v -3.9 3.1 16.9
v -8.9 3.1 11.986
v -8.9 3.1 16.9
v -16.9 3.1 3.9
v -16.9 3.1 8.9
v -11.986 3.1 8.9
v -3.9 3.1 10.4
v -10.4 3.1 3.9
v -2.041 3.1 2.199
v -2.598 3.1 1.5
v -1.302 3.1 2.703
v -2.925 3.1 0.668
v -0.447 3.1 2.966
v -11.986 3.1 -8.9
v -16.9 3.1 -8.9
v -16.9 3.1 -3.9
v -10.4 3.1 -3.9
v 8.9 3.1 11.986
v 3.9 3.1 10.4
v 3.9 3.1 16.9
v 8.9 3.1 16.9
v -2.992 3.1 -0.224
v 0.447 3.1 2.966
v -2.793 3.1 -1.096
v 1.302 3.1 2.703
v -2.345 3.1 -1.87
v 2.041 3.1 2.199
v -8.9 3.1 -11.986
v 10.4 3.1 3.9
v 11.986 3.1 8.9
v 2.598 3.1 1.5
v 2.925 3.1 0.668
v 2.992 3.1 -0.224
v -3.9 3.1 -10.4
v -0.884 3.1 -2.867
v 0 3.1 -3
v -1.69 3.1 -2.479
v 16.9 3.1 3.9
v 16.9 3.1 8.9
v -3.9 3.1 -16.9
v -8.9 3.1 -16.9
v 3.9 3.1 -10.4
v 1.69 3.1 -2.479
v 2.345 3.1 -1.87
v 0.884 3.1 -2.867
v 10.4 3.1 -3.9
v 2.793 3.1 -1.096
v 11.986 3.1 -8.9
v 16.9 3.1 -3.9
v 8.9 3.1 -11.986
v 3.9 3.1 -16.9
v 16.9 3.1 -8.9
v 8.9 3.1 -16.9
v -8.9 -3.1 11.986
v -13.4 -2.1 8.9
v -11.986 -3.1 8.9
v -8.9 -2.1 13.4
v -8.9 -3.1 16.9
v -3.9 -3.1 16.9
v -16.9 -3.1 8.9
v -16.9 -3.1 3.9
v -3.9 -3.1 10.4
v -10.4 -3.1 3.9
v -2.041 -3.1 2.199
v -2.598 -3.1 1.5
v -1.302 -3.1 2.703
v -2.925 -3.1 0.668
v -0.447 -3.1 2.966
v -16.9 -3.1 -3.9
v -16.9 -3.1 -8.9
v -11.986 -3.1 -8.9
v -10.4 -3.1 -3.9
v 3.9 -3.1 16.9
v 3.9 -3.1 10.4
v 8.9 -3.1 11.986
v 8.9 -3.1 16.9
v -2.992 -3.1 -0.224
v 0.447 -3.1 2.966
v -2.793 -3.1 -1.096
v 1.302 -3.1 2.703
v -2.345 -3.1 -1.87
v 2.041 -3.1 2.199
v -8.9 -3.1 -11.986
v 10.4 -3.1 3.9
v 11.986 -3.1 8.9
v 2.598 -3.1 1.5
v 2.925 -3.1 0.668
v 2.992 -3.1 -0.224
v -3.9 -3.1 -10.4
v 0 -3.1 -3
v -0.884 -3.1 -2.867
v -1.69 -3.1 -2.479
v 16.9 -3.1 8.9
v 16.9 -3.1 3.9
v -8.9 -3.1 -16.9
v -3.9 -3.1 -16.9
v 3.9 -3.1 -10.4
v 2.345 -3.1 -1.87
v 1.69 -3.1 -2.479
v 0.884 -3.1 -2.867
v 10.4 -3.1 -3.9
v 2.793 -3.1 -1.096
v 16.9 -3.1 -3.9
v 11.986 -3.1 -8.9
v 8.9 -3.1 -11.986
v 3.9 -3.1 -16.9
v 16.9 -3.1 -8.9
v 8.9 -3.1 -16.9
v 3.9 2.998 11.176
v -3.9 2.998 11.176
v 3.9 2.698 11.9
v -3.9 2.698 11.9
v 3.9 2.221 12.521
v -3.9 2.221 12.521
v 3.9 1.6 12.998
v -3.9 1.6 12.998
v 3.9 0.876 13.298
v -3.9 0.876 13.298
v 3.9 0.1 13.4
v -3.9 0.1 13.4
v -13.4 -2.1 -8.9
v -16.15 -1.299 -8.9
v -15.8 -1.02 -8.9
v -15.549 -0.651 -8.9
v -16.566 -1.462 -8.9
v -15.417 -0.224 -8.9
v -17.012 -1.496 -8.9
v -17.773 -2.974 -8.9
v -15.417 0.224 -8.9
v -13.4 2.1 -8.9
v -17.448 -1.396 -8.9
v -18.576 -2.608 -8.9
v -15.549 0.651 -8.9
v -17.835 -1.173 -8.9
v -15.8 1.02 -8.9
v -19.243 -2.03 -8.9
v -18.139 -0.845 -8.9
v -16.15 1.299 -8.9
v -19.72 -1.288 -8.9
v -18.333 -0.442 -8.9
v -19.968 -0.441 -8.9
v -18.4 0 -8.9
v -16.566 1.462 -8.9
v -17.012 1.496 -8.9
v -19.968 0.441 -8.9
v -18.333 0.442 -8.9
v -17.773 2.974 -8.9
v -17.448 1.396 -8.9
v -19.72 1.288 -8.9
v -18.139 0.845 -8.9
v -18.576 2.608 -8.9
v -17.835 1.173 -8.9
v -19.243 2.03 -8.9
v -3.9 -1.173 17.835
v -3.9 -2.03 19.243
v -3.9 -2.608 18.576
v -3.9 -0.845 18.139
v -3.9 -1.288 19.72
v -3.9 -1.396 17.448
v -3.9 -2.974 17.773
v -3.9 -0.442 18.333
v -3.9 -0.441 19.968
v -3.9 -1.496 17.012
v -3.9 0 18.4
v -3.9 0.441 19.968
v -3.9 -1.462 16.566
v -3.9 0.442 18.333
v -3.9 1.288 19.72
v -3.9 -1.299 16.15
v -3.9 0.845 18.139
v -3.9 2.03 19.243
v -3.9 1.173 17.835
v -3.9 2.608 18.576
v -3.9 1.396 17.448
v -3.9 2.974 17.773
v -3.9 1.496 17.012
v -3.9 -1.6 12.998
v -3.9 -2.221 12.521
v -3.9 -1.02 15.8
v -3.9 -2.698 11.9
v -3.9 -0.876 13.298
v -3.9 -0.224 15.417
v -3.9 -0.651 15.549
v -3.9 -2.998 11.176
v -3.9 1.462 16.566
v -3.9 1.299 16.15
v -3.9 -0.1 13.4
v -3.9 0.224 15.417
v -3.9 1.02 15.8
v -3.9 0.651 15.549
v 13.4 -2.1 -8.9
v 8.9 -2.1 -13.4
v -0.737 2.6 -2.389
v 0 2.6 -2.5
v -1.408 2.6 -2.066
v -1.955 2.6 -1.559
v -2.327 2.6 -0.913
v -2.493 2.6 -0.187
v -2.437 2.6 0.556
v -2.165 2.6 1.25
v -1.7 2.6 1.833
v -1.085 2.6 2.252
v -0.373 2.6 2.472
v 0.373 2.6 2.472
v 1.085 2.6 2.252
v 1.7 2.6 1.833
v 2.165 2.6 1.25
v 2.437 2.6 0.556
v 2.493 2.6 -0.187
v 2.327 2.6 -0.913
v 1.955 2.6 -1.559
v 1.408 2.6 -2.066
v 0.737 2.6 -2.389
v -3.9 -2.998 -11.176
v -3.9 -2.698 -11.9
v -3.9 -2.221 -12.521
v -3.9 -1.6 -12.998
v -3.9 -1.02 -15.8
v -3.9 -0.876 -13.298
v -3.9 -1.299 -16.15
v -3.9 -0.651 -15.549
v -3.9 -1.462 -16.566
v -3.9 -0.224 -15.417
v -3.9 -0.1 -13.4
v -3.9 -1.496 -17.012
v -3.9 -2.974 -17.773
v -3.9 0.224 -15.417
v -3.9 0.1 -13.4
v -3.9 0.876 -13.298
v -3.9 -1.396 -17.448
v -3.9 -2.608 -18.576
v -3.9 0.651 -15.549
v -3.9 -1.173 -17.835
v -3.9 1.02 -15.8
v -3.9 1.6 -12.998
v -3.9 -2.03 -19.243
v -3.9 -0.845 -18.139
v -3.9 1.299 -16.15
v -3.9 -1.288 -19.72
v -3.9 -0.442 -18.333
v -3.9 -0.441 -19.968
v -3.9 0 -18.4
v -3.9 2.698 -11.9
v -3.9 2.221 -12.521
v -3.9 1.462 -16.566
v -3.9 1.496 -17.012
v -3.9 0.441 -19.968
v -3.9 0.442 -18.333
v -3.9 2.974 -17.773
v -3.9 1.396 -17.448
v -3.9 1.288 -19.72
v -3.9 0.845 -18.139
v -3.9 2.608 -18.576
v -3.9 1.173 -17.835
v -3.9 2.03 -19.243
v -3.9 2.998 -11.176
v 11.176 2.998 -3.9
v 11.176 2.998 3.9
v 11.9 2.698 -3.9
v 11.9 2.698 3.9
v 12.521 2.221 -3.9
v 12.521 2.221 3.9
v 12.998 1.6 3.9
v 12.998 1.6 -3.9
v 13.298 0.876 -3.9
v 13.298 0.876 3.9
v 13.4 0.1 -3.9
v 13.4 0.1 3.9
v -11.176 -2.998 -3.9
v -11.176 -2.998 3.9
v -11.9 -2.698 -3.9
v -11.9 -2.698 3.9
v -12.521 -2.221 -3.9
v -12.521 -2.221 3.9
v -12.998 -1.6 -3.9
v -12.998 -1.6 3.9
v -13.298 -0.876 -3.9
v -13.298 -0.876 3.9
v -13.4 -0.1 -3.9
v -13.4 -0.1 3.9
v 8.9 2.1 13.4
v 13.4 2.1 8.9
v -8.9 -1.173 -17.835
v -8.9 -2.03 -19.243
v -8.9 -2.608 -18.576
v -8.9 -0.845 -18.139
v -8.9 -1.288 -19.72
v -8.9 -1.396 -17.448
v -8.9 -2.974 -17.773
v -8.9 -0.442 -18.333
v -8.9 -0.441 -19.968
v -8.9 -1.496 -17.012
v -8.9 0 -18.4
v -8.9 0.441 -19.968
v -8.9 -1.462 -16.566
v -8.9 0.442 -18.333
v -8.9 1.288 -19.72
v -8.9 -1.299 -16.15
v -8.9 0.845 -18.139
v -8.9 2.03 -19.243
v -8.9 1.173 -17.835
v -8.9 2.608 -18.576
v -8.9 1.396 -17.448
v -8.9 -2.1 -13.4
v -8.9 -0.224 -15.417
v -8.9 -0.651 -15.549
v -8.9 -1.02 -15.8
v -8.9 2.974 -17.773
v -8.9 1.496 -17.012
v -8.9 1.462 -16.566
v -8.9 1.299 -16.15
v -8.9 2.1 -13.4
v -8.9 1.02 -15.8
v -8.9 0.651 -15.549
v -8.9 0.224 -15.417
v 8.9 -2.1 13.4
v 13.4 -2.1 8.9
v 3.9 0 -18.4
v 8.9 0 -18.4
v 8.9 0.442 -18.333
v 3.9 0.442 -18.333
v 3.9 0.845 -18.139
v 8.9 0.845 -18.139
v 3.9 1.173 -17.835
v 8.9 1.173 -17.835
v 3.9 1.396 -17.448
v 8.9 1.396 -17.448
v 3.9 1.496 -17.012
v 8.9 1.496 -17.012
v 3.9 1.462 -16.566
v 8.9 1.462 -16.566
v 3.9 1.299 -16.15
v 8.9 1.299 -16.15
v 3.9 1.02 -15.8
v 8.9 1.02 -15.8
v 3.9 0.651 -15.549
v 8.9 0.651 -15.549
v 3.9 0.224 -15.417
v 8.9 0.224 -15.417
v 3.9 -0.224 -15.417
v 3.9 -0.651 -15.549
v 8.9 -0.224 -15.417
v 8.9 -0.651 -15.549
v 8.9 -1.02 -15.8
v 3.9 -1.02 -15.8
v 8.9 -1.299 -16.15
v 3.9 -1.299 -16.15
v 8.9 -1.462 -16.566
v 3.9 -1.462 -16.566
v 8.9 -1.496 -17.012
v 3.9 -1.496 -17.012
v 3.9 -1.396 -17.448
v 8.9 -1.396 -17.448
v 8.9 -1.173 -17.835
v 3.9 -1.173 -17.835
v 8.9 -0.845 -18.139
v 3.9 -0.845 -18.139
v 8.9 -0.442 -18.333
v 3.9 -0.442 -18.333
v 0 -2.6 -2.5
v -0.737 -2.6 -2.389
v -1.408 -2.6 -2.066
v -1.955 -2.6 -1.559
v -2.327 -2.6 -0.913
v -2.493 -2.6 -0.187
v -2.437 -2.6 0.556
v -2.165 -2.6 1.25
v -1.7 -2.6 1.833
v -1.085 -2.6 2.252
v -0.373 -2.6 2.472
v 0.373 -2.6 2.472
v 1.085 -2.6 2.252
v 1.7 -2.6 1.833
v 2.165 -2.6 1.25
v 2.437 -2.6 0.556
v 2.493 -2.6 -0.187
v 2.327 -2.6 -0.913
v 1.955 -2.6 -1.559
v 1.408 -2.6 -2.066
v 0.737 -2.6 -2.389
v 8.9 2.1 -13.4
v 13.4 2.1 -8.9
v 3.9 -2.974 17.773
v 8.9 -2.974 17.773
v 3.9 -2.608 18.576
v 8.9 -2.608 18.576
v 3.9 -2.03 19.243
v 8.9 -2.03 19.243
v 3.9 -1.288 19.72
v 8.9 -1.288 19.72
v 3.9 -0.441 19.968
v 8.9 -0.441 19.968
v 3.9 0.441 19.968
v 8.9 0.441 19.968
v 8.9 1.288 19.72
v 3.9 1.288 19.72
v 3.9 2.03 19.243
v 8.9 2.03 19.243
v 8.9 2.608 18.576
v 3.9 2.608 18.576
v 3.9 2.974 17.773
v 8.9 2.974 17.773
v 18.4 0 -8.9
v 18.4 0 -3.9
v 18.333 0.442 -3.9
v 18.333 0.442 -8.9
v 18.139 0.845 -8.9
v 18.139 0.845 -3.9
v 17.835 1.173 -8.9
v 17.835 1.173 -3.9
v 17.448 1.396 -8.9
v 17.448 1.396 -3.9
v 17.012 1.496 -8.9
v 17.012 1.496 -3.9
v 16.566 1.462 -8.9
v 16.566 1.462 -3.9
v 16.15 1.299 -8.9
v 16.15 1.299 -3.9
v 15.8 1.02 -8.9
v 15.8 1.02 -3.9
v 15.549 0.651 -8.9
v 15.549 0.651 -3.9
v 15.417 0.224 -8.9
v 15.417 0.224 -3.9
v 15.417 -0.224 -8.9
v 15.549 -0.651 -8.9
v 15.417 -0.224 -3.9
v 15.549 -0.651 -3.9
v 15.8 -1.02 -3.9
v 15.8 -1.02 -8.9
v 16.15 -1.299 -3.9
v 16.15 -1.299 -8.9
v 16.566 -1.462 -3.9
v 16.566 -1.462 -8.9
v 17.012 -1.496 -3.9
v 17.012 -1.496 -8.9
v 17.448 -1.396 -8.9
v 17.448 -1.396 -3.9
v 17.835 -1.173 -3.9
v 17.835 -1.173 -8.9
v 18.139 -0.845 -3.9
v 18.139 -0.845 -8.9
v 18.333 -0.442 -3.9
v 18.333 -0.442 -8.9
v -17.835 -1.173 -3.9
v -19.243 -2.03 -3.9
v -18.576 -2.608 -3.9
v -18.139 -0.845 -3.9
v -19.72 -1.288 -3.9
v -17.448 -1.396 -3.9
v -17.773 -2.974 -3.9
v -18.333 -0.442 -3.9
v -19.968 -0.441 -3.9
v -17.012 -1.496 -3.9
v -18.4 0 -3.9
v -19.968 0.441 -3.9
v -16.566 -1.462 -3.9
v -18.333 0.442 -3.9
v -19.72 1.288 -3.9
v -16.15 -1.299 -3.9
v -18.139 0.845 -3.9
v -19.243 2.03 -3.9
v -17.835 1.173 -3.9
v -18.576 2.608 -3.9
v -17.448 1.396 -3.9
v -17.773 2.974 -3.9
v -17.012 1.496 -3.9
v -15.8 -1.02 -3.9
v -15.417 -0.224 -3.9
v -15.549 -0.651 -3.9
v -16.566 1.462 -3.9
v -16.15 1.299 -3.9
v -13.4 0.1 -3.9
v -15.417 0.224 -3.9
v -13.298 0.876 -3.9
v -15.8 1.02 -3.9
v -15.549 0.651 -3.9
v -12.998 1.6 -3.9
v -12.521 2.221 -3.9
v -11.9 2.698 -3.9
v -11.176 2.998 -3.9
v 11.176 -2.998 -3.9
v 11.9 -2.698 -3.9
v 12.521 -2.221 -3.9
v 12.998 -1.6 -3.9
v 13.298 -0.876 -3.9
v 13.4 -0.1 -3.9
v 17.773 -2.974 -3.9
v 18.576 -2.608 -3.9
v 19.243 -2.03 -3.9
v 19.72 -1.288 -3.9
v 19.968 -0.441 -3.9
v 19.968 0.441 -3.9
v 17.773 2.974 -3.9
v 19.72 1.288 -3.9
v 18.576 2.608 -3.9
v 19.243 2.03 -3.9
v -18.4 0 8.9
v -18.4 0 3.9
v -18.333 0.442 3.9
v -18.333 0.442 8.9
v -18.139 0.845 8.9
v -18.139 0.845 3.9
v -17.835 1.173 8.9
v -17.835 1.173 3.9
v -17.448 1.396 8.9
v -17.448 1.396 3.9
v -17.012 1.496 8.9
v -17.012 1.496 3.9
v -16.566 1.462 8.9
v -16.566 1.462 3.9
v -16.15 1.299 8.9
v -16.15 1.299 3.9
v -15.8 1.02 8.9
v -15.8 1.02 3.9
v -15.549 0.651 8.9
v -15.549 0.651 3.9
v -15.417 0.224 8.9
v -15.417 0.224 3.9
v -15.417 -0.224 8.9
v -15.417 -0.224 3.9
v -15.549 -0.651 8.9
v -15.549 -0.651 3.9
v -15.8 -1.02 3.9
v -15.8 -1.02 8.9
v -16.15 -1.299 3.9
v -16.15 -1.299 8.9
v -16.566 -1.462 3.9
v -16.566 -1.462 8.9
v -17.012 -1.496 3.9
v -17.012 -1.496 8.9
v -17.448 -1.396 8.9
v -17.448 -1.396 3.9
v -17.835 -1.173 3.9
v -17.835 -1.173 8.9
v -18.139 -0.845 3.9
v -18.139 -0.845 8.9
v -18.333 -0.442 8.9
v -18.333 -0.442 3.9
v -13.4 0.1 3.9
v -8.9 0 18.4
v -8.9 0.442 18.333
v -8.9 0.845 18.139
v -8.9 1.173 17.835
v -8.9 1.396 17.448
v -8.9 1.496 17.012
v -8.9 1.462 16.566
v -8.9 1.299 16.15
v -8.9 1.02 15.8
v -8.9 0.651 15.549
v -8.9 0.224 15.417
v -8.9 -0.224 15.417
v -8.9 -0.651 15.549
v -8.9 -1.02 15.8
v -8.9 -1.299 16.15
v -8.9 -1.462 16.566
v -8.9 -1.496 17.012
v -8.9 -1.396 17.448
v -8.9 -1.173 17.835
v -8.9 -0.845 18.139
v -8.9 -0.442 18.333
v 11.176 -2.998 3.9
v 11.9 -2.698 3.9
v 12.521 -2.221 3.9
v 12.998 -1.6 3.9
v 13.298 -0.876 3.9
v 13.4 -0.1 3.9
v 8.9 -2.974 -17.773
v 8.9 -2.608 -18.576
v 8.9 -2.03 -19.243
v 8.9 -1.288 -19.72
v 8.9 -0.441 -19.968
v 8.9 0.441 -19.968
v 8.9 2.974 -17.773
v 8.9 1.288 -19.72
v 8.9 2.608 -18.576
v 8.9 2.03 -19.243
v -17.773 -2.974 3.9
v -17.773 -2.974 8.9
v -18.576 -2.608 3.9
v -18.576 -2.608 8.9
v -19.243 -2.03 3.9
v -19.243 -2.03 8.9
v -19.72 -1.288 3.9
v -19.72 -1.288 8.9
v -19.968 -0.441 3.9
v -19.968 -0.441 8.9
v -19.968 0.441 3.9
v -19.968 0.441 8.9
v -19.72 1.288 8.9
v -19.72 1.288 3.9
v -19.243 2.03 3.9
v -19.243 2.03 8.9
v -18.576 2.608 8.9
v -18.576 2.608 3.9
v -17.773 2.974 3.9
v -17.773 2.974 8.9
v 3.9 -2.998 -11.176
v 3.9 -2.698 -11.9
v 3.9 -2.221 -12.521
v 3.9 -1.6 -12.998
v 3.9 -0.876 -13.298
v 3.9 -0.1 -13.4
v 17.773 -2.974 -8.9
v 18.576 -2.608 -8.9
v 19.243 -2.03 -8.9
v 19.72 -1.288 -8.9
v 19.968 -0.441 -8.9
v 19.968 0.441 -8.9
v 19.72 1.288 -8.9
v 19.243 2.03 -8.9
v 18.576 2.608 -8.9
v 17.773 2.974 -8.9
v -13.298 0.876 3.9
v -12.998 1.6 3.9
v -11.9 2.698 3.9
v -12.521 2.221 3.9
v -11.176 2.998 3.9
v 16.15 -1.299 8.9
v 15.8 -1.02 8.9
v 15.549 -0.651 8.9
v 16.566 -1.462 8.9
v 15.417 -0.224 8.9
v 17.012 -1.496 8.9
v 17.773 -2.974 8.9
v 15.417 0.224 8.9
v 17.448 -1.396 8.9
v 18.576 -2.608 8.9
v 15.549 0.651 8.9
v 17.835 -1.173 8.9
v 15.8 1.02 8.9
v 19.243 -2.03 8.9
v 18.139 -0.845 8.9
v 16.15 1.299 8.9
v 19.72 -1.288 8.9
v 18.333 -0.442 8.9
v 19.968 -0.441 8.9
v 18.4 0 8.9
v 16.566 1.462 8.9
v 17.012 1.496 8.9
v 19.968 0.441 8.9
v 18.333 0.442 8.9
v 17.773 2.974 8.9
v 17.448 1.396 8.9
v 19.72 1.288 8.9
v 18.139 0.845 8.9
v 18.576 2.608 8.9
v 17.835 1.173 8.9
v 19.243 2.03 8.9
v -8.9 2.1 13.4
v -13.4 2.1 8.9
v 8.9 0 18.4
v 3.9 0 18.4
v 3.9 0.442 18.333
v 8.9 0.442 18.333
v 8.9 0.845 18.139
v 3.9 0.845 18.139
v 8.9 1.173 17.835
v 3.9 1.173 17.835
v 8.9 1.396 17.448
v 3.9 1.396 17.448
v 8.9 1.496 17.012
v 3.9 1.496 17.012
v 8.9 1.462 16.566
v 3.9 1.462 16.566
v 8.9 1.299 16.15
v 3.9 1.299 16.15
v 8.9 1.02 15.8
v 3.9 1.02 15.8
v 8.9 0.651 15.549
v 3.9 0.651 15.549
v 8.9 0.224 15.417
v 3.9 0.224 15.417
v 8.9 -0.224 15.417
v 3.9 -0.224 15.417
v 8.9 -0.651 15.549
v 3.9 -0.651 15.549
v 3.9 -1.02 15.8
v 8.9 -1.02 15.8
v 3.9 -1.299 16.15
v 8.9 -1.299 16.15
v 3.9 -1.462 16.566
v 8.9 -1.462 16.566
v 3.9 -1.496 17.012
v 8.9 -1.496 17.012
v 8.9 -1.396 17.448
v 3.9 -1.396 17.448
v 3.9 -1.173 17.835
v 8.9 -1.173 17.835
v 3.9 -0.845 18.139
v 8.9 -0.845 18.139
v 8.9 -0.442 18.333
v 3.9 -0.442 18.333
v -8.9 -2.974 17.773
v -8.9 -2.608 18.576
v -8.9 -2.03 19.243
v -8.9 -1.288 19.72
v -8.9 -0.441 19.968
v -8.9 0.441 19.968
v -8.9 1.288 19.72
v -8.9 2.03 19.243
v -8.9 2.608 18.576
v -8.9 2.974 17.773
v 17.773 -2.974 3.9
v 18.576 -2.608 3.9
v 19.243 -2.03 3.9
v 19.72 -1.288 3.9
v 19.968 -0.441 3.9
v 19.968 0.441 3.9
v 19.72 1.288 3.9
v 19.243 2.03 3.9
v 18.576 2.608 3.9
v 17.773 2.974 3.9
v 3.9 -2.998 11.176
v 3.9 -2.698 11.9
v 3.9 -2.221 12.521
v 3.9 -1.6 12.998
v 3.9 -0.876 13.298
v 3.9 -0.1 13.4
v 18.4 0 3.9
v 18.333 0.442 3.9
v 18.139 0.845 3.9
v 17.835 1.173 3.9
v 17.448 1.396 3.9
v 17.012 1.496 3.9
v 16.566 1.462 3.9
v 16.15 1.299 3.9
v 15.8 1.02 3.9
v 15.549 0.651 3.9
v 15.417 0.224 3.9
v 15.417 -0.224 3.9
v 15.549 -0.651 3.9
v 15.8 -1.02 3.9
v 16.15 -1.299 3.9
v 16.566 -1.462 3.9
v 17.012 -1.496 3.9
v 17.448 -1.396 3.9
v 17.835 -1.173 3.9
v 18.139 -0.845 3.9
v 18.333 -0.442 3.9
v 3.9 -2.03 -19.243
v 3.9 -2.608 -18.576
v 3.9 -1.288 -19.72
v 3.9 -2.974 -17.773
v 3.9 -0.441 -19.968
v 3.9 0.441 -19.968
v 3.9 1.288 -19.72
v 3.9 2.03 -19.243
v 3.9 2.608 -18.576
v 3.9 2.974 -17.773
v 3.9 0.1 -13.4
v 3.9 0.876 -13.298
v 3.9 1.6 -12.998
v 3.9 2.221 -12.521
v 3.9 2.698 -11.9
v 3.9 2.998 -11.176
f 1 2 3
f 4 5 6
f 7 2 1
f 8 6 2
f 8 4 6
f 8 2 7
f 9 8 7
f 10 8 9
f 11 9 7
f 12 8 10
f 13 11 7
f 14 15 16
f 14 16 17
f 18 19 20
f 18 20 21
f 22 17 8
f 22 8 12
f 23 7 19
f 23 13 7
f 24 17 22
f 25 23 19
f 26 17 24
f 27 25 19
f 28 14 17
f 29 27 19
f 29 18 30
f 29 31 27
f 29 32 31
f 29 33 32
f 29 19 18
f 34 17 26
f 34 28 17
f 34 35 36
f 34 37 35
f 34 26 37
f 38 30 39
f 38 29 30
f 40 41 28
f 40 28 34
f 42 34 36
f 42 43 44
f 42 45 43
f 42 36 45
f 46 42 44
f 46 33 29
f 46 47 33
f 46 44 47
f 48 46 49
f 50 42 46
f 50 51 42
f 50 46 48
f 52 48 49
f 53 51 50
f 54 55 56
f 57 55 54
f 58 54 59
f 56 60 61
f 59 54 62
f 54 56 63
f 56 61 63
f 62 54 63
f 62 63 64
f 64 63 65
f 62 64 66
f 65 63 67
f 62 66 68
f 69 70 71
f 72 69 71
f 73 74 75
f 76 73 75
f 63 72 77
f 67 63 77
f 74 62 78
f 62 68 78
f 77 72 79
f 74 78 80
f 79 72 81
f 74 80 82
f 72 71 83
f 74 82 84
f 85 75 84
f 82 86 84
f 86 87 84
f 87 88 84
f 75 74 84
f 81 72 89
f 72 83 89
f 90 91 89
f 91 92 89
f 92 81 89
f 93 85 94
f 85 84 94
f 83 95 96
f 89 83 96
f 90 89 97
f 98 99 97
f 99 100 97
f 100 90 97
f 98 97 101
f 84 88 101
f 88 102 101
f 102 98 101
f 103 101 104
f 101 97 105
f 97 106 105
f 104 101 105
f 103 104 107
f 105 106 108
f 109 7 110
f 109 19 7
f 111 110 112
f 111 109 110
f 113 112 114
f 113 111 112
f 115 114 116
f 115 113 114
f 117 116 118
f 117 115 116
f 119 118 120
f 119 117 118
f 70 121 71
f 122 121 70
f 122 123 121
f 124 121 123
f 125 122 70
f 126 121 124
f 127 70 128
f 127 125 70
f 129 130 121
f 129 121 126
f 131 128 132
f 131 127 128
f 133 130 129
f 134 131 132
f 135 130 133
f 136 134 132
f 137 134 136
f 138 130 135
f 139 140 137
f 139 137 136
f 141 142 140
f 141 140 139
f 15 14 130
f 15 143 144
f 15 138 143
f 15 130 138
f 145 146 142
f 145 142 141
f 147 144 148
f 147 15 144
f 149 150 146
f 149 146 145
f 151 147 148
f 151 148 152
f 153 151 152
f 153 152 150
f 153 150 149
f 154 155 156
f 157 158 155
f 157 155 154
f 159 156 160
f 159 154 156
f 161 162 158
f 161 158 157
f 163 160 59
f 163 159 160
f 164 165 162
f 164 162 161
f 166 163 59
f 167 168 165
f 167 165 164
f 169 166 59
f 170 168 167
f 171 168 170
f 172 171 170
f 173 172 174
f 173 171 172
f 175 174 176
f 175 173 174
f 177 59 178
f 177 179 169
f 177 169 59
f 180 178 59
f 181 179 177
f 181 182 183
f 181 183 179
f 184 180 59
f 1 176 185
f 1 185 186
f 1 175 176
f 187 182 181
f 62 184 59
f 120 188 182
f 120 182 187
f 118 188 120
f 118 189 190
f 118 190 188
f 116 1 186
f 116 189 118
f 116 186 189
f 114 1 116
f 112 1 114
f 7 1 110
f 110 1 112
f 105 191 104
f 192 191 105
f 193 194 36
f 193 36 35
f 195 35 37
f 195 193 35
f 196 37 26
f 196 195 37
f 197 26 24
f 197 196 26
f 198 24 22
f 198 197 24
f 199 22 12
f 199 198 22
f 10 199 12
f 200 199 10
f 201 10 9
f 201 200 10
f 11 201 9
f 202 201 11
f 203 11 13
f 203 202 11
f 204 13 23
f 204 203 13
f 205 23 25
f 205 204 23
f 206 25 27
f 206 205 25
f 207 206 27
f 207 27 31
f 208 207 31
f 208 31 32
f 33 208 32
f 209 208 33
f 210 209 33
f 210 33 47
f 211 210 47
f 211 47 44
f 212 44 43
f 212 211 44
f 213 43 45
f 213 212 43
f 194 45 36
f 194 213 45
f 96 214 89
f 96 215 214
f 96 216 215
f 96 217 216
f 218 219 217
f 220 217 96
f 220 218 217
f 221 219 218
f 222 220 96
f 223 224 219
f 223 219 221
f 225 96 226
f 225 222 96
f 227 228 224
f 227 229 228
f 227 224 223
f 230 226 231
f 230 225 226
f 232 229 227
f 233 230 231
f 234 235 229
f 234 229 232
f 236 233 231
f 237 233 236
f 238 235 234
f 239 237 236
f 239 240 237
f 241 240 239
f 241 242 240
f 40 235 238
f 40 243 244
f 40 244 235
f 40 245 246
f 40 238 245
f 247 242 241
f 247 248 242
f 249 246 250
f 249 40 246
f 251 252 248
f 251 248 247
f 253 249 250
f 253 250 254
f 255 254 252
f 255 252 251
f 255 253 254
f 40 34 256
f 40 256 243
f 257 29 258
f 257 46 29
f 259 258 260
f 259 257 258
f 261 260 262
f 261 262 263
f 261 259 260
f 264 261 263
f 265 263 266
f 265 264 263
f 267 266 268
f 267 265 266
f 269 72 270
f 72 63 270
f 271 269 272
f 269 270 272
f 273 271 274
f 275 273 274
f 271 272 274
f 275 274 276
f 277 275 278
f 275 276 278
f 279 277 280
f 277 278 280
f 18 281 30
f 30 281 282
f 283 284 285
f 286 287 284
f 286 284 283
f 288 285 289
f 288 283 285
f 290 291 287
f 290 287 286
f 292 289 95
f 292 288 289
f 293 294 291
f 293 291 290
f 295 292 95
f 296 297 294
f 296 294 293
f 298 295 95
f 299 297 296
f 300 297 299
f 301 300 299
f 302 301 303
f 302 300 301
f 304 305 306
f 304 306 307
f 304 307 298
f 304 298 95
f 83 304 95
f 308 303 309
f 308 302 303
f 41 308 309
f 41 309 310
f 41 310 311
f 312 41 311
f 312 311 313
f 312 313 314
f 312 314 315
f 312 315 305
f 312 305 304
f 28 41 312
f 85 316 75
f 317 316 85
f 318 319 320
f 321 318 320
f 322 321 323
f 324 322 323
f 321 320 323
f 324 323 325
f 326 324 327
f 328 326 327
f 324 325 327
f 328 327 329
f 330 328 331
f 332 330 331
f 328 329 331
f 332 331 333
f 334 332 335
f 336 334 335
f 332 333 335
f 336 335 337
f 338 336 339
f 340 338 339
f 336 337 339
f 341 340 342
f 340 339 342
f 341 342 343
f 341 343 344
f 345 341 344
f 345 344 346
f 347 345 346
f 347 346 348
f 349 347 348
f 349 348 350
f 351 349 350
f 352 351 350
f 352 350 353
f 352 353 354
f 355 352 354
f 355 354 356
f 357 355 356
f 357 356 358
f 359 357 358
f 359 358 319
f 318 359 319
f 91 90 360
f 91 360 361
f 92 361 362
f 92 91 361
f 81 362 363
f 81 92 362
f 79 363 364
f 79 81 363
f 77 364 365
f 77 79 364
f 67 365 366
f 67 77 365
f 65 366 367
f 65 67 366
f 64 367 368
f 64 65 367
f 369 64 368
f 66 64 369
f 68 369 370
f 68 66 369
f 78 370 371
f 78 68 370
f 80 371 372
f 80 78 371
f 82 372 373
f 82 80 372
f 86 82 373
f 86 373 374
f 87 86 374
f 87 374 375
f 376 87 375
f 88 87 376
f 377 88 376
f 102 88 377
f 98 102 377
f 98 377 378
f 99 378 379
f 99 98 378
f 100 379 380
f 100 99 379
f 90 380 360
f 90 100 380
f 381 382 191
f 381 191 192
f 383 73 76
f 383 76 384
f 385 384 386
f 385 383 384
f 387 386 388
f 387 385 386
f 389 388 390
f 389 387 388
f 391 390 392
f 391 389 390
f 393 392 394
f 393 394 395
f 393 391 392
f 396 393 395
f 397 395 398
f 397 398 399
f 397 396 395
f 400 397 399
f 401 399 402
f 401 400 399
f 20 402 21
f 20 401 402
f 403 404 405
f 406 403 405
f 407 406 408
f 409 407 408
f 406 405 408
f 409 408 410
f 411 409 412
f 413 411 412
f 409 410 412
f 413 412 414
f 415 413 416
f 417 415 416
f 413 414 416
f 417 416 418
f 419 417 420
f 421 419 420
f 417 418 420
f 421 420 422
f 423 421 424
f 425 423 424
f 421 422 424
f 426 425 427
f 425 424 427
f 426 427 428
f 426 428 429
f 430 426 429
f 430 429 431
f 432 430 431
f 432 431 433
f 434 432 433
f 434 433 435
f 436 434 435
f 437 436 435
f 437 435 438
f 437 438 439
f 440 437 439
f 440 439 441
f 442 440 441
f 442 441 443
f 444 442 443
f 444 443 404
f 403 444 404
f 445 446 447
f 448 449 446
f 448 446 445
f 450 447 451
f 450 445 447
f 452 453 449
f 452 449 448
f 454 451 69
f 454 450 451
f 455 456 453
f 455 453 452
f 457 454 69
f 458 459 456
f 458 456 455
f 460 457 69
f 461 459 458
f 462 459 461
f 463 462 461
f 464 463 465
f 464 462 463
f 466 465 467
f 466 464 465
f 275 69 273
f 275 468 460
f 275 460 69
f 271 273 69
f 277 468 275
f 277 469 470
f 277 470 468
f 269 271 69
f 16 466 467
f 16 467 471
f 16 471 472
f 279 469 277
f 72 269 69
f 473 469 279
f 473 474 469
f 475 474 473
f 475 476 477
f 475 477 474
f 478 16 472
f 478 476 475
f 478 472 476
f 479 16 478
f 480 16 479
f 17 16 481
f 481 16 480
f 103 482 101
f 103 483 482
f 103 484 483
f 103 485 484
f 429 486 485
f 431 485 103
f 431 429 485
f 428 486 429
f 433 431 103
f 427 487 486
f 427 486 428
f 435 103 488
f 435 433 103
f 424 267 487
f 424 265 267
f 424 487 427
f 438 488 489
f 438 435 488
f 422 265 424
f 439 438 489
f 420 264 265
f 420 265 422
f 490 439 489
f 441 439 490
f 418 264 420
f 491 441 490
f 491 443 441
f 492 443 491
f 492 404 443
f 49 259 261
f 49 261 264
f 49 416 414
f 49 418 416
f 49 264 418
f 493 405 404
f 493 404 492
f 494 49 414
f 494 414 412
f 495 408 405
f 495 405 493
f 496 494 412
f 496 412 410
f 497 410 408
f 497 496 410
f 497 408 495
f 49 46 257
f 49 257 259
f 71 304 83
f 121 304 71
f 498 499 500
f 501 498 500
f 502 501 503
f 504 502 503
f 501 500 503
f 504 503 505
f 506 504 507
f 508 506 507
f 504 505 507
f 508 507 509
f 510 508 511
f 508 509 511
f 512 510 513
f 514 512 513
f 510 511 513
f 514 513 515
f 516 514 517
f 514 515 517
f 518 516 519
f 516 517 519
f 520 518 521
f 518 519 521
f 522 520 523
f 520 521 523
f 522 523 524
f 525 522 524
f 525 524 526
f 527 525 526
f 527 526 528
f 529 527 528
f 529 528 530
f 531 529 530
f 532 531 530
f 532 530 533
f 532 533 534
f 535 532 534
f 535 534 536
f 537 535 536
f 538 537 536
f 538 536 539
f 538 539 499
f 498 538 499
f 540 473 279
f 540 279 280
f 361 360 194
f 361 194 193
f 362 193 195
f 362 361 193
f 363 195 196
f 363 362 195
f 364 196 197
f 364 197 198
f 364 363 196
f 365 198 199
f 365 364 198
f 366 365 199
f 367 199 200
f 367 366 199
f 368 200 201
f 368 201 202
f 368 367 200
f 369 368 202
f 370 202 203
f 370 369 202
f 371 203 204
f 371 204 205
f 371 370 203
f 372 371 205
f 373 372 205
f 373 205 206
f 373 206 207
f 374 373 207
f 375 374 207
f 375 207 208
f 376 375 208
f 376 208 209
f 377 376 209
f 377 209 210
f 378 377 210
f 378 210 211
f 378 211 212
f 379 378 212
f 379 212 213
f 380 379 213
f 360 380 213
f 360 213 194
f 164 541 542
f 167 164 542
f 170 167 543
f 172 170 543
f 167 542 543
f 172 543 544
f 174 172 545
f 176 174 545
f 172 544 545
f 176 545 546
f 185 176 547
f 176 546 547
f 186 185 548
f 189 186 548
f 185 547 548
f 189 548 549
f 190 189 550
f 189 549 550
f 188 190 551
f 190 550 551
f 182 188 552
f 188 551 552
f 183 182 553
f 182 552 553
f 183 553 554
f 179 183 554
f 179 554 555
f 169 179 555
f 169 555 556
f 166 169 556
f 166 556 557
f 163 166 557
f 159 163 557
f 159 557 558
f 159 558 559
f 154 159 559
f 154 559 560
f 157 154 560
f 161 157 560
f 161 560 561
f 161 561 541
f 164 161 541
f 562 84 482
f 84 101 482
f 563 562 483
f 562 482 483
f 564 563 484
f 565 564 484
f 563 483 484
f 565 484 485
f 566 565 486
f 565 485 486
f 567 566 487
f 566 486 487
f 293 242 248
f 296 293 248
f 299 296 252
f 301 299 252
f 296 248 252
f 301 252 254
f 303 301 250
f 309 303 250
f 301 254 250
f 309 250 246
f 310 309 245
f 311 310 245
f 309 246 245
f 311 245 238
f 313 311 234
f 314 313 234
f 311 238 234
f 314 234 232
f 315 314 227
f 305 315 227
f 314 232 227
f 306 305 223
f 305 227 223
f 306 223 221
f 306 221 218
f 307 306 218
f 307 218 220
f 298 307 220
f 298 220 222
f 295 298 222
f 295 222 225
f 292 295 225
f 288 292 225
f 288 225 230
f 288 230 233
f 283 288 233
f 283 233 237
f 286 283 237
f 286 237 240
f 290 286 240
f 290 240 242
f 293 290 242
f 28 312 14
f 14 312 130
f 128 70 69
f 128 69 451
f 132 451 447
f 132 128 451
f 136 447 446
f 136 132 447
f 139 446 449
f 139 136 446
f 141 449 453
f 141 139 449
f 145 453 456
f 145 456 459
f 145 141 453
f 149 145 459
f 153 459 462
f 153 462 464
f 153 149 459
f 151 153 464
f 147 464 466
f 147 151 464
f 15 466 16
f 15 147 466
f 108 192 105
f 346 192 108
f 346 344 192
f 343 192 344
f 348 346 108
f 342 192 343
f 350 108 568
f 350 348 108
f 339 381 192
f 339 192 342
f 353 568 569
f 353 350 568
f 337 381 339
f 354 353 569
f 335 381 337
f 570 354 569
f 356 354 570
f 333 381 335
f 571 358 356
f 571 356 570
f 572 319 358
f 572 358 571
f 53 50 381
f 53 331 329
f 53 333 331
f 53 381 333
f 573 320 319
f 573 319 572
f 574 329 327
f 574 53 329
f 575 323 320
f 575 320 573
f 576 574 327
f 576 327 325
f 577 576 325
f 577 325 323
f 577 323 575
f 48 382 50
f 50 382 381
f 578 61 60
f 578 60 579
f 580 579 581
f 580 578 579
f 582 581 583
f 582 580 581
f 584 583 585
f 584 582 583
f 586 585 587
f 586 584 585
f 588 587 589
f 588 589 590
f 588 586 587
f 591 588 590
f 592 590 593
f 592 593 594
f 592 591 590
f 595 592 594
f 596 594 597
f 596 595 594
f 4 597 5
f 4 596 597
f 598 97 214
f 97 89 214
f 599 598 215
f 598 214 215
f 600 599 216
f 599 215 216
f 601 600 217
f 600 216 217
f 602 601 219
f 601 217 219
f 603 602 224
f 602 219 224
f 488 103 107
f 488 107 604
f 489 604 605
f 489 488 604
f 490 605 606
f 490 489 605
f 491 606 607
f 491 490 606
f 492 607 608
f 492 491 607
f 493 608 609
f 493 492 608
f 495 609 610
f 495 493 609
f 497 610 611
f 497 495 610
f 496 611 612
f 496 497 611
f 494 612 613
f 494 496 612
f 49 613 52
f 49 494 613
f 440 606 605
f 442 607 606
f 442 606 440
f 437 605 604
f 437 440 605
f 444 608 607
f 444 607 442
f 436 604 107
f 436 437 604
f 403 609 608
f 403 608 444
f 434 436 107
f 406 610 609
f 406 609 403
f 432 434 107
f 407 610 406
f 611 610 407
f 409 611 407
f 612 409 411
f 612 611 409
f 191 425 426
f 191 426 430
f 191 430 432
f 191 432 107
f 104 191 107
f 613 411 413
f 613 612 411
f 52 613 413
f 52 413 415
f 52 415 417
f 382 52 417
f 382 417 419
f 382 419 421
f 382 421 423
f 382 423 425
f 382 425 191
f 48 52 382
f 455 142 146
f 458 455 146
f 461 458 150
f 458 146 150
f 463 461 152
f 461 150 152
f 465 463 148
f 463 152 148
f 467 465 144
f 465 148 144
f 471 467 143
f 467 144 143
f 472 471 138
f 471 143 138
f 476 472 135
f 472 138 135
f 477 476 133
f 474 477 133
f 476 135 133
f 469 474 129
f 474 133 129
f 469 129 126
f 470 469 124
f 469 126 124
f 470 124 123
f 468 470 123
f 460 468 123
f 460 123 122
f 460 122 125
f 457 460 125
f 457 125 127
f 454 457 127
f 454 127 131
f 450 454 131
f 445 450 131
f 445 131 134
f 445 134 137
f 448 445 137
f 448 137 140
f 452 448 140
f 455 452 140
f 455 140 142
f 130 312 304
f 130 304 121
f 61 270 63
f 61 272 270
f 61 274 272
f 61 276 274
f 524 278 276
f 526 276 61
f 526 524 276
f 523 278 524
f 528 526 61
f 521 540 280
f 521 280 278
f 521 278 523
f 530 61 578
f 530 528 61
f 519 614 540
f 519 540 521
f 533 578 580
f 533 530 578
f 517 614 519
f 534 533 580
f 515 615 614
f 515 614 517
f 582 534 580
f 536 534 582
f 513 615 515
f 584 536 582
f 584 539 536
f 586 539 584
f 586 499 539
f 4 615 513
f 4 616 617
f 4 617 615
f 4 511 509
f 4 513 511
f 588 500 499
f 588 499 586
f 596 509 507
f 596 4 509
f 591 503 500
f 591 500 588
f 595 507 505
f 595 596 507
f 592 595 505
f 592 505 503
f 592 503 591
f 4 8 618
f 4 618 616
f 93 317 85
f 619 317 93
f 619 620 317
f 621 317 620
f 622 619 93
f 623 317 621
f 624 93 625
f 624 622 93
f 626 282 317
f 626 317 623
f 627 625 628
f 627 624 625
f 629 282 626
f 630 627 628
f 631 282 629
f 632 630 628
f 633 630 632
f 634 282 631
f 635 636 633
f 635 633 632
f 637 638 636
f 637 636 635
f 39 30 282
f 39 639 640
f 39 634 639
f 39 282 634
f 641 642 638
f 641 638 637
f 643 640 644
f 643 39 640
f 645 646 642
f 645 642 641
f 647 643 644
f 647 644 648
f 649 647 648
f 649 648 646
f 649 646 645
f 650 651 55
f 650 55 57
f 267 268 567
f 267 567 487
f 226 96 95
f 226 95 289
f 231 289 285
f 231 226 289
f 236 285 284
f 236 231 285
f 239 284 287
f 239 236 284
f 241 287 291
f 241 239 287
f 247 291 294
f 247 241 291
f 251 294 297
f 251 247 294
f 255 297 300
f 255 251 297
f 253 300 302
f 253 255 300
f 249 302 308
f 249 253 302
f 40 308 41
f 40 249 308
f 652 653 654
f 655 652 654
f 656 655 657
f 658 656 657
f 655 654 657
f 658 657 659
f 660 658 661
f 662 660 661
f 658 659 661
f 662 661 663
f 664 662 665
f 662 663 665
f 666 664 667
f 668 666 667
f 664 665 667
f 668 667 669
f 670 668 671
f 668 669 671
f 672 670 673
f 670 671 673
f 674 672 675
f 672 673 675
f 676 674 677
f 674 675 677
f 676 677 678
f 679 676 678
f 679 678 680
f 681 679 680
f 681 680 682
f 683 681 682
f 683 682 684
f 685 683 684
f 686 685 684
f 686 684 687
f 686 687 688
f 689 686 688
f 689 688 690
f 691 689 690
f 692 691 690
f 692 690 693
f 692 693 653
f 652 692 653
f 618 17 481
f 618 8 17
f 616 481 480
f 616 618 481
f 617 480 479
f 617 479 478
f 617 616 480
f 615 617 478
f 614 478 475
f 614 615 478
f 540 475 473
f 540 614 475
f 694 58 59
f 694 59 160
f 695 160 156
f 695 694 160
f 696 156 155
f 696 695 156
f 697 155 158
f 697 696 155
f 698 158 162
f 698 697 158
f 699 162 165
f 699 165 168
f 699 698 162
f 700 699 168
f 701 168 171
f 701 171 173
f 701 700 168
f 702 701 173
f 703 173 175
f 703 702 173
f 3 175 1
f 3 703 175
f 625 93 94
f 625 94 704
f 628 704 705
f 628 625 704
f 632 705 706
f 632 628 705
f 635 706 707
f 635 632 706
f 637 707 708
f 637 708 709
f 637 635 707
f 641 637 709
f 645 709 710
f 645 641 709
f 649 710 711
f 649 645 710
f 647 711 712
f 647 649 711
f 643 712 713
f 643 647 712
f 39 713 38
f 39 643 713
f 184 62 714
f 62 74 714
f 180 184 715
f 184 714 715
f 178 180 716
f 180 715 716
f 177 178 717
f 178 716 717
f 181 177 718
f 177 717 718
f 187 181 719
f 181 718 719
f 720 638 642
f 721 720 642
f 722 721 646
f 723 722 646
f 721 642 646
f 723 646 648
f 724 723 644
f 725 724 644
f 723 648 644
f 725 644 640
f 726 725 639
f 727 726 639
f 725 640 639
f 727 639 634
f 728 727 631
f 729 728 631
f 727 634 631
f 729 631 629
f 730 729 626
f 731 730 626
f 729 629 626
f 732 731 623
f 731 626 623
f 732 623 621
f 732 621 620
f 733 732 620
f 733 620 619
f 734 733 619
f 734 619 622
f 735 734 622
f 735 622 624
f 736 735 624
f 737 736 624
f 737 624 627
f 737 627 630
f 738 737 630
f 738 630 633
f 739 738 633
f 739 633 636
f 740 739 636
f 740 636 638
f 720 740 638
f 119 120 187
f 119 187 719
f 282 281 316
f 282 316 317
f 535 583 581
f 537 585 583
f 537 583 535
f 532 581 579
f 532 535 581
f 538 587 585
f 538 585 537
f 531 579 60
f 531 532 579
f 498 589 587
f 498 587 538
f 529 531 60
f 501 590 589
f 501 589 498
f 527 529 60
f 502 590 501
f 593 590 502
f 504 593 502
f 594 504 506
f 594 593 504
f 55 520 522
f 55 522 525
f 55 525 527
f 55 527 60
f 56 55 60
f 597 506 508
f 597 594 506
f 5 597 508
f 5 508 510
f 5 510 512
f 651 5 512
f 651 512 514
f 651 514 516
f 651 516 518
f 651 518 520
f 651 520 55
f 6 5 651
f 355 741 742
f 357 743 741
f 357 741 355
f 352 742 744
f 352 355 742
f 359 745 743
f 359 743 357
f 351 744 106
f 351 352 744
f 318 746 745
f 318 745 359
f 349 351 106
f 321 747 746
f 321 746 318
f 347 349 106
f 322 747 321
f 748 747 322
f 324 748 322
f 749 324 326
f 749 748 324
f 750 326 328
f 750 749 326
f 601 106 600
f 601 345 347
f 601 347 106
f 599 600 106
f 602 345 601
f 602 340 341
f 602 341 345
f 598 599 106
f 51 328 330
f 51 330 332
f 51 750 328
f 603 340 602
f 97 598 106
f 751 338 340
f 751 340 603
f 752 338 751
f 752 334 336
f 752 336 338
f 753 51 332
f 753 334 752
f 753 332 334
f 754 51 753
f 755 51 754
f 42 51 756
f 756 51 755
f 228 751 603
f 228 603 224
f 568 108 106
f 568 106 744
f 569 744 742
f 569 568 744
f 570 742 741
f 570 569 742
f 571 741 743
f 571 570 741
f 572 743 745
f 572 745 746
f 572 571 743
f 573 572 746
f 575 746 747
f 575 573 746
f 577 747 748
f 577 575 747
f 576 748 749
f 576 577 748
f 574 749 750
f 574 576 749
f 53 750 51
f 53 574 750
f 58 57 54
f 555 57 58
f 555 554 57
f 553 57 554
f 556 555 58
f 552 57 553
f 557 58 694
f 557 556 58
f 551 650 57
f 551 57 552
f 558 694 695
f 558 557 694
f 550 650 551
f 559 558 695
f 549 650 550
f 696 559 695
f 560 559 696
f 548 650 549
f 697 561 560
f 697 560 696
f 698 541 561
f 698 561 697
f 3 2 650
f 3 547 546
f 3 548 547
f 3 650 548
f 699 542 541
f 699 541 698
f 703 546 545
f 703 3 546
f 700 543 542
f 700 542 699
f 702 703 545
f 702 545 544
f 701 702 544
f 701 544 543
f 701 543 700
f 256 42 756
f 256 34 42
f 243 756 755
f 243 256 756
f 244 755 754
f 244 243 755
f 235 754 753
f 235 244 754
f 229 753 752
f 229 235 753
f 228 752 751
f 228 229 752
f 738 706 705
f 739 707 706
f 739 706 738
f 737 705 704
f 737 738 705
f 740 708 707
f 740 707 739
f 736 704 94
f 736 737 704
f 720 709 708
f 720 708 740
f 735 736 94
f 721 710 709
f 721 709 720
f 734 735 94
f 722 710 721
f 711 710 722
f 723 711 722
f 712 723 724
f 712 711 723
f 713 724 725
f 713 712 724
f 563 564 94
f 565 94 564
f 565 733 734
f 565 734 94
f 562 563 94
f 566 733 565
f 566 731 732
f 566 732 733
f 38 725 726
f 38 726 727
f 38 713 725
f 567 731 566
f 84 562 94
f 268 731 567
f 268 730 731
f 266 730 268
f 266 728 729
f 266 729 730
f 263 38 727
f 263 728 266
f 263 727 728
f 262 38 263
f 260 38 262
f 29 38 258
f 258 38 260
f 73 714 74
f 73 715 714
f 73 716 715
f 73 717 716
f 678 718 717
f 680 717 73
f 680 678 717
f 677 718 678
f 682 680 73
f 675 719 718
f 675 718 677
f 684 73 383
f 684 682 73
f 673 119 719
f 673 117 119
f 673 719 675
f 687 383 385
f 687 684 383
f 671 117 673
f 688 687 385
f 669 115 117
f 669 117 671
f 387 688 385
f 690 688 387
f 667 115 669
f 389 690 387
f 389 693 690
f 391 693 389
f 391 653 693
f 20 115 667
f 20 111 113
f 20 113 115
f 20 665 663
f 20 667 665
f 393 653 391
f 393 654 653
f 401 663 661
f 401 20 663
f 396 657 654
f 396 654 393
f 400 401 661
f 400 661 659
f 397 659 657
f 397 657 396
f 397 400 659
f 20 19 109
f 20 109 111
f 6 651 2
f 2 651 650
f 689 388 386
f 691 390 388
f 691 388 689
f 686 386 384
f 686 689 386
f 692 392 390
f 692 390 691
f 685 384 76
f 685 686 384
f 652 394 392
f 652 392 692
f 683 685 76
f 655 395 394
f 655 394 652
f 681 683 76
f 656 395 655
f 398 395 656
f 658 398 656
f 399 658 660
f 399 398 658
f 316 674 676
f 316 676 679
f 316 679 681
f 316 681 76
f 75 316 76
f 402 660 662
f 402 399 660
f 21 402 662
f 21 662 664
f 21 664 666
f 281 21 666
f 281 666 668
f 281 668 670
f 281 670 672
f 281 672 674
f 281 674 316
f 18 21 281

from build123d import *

# Parameters (mm, degrees)
SKETCH1_R           = 2.5
BOSS_EXTRUDE1_DEPTH = 3.1
SKETCH2_R           = 1.5
CUT_EXTRUDE1_DEPTH  = 36.836573497
CIRPATTERN1_COUNT   = 4
FILLET1_R           = 3
CHAMFER1_SIZE       = 1
CHAMFER3_SIZE       = 0.5


with BuildPart() as part:
    # Sketch1 → Boss-Extrude1 (new, symmetric)
    with BuildSketch(Plane(origin=(0, 0, 0), x_dir=(1, 0, 0), z_dir=(0, 1, 0))):
        Polygon((-8.9, -13.4), (-8.9, -20.4), (-3.9, -20.4), (-3.9, -13.4), (3.9, -13.4), (3.9, -20.4), (8.9, -20.4), (8.9, -13.4), (13.4, -8.9), (20.4, -8.9), (20.4, -3.9), (13.4, -3.9), (13.4, 3.9), (20.4, 3.9), (20.4, 8.9), (13.4, 8.9), (8.9, 13.4), (8.9, 20.4), (3.9, 20.4), (3.9, 13.4), (-3.9, 13.4), (-3.9, 20.4), (-8.9, 20.4), (-8.9, 13.4), (-13.4, 8.9), (-20.4, 8.9), (-20.4, 3.9), (-13.4, 3.9), (-13.4, -3.9), (-20.4, -3.9), (-20.4, -8.9), (-13.4, -8.9), align=None)
        with Locations(Location((0, 0, 0), (0, 0, 90))):
            Circle(SKETCH1_R, mode=Mode.SUBTRACT)
    extrude(amount=BOSS_EXTRUDE1_DEPTH, both=True)

    # Sketch2 → Cut-Extrude1 (cut, symmetric)
    with BuildSketch(Plane.ZY.offset(8.9)):
        with Locations((16.9, 0)):
            Circle(SKETCH2_R)
        with BuildLine():
            Line((16.9, 3.1), (20.4, 3.1))
            Line((20.4, 3.1), (20.4, -3.1))
            Line((20.4, -3.1), (16.9, -3.1))
            ThreePointArc((16.9, -3.1), (20, 0), (16.9, 3.1))
        make_face()
    cut_extrude1 = extrude(amount=CUT_EXTRUDE1_DEPTH, both=True, mode=Mode.SUBTRACT)

    # CirPattern1: Cut-Extrude1 ×4 about axis
    cirpattern1_axis = Axis((0, 3.1, 0), (0, 1, 0))
    for i in range(1, CIRPATTERN1_COUNT):
        add(cut_extrude1.rotate(cirpattern1_axis, i * 360 / CIRPATTERN1_COUNT), mode=Mode.SUBTRACT)

    # Fillet1
    fillet1_edges = [part.edges().sort_by_distance(p)[0] for p in [
        (-13.4, 3.1, 0),
        (0, 3.1, 13.4),
        (-13.4, -3.1, 0),
        (0, -3.1, -13.4),
        (13.4, -3.1, 0),
        (0, -3.1, 13.4),
        (13.4, 3.1, 0),
        (0, 3.1, -13.4),
    ]]
    fillet(fillet1_edges, radius=FILLET1_R)

    # Chamfer1
    chamfer1_edges = [part.edges().sort_by_distance(p)[0] for p in [
        (-11.15, 3.1, -11.15),
        (-11.15, -3.1, -11.15),
        (11.15, -3.1, -11.15),
        (11.15, 3.1, 11.15),
        (11.15, -3.1, 11.15),
        (-11.15, -3.1, 11.15),
        (-11.15, 3.1, 11.15),
        (11.15, 3.1, -11.15),
    ]]
    chamfer(chamfer1_edges, length=CHAMFER1_SIZE)

    # Chamfer3
    chamfer3_edges = [part.edges().sort_by_distance(p)[0] for p in [
        (0, -3.1, 2.5),
        (0, 3.1, 2.5),
    ]]
    chamfer(chamfer3_edges, length=CHAMFER3_SIZE)


solid = part.part
